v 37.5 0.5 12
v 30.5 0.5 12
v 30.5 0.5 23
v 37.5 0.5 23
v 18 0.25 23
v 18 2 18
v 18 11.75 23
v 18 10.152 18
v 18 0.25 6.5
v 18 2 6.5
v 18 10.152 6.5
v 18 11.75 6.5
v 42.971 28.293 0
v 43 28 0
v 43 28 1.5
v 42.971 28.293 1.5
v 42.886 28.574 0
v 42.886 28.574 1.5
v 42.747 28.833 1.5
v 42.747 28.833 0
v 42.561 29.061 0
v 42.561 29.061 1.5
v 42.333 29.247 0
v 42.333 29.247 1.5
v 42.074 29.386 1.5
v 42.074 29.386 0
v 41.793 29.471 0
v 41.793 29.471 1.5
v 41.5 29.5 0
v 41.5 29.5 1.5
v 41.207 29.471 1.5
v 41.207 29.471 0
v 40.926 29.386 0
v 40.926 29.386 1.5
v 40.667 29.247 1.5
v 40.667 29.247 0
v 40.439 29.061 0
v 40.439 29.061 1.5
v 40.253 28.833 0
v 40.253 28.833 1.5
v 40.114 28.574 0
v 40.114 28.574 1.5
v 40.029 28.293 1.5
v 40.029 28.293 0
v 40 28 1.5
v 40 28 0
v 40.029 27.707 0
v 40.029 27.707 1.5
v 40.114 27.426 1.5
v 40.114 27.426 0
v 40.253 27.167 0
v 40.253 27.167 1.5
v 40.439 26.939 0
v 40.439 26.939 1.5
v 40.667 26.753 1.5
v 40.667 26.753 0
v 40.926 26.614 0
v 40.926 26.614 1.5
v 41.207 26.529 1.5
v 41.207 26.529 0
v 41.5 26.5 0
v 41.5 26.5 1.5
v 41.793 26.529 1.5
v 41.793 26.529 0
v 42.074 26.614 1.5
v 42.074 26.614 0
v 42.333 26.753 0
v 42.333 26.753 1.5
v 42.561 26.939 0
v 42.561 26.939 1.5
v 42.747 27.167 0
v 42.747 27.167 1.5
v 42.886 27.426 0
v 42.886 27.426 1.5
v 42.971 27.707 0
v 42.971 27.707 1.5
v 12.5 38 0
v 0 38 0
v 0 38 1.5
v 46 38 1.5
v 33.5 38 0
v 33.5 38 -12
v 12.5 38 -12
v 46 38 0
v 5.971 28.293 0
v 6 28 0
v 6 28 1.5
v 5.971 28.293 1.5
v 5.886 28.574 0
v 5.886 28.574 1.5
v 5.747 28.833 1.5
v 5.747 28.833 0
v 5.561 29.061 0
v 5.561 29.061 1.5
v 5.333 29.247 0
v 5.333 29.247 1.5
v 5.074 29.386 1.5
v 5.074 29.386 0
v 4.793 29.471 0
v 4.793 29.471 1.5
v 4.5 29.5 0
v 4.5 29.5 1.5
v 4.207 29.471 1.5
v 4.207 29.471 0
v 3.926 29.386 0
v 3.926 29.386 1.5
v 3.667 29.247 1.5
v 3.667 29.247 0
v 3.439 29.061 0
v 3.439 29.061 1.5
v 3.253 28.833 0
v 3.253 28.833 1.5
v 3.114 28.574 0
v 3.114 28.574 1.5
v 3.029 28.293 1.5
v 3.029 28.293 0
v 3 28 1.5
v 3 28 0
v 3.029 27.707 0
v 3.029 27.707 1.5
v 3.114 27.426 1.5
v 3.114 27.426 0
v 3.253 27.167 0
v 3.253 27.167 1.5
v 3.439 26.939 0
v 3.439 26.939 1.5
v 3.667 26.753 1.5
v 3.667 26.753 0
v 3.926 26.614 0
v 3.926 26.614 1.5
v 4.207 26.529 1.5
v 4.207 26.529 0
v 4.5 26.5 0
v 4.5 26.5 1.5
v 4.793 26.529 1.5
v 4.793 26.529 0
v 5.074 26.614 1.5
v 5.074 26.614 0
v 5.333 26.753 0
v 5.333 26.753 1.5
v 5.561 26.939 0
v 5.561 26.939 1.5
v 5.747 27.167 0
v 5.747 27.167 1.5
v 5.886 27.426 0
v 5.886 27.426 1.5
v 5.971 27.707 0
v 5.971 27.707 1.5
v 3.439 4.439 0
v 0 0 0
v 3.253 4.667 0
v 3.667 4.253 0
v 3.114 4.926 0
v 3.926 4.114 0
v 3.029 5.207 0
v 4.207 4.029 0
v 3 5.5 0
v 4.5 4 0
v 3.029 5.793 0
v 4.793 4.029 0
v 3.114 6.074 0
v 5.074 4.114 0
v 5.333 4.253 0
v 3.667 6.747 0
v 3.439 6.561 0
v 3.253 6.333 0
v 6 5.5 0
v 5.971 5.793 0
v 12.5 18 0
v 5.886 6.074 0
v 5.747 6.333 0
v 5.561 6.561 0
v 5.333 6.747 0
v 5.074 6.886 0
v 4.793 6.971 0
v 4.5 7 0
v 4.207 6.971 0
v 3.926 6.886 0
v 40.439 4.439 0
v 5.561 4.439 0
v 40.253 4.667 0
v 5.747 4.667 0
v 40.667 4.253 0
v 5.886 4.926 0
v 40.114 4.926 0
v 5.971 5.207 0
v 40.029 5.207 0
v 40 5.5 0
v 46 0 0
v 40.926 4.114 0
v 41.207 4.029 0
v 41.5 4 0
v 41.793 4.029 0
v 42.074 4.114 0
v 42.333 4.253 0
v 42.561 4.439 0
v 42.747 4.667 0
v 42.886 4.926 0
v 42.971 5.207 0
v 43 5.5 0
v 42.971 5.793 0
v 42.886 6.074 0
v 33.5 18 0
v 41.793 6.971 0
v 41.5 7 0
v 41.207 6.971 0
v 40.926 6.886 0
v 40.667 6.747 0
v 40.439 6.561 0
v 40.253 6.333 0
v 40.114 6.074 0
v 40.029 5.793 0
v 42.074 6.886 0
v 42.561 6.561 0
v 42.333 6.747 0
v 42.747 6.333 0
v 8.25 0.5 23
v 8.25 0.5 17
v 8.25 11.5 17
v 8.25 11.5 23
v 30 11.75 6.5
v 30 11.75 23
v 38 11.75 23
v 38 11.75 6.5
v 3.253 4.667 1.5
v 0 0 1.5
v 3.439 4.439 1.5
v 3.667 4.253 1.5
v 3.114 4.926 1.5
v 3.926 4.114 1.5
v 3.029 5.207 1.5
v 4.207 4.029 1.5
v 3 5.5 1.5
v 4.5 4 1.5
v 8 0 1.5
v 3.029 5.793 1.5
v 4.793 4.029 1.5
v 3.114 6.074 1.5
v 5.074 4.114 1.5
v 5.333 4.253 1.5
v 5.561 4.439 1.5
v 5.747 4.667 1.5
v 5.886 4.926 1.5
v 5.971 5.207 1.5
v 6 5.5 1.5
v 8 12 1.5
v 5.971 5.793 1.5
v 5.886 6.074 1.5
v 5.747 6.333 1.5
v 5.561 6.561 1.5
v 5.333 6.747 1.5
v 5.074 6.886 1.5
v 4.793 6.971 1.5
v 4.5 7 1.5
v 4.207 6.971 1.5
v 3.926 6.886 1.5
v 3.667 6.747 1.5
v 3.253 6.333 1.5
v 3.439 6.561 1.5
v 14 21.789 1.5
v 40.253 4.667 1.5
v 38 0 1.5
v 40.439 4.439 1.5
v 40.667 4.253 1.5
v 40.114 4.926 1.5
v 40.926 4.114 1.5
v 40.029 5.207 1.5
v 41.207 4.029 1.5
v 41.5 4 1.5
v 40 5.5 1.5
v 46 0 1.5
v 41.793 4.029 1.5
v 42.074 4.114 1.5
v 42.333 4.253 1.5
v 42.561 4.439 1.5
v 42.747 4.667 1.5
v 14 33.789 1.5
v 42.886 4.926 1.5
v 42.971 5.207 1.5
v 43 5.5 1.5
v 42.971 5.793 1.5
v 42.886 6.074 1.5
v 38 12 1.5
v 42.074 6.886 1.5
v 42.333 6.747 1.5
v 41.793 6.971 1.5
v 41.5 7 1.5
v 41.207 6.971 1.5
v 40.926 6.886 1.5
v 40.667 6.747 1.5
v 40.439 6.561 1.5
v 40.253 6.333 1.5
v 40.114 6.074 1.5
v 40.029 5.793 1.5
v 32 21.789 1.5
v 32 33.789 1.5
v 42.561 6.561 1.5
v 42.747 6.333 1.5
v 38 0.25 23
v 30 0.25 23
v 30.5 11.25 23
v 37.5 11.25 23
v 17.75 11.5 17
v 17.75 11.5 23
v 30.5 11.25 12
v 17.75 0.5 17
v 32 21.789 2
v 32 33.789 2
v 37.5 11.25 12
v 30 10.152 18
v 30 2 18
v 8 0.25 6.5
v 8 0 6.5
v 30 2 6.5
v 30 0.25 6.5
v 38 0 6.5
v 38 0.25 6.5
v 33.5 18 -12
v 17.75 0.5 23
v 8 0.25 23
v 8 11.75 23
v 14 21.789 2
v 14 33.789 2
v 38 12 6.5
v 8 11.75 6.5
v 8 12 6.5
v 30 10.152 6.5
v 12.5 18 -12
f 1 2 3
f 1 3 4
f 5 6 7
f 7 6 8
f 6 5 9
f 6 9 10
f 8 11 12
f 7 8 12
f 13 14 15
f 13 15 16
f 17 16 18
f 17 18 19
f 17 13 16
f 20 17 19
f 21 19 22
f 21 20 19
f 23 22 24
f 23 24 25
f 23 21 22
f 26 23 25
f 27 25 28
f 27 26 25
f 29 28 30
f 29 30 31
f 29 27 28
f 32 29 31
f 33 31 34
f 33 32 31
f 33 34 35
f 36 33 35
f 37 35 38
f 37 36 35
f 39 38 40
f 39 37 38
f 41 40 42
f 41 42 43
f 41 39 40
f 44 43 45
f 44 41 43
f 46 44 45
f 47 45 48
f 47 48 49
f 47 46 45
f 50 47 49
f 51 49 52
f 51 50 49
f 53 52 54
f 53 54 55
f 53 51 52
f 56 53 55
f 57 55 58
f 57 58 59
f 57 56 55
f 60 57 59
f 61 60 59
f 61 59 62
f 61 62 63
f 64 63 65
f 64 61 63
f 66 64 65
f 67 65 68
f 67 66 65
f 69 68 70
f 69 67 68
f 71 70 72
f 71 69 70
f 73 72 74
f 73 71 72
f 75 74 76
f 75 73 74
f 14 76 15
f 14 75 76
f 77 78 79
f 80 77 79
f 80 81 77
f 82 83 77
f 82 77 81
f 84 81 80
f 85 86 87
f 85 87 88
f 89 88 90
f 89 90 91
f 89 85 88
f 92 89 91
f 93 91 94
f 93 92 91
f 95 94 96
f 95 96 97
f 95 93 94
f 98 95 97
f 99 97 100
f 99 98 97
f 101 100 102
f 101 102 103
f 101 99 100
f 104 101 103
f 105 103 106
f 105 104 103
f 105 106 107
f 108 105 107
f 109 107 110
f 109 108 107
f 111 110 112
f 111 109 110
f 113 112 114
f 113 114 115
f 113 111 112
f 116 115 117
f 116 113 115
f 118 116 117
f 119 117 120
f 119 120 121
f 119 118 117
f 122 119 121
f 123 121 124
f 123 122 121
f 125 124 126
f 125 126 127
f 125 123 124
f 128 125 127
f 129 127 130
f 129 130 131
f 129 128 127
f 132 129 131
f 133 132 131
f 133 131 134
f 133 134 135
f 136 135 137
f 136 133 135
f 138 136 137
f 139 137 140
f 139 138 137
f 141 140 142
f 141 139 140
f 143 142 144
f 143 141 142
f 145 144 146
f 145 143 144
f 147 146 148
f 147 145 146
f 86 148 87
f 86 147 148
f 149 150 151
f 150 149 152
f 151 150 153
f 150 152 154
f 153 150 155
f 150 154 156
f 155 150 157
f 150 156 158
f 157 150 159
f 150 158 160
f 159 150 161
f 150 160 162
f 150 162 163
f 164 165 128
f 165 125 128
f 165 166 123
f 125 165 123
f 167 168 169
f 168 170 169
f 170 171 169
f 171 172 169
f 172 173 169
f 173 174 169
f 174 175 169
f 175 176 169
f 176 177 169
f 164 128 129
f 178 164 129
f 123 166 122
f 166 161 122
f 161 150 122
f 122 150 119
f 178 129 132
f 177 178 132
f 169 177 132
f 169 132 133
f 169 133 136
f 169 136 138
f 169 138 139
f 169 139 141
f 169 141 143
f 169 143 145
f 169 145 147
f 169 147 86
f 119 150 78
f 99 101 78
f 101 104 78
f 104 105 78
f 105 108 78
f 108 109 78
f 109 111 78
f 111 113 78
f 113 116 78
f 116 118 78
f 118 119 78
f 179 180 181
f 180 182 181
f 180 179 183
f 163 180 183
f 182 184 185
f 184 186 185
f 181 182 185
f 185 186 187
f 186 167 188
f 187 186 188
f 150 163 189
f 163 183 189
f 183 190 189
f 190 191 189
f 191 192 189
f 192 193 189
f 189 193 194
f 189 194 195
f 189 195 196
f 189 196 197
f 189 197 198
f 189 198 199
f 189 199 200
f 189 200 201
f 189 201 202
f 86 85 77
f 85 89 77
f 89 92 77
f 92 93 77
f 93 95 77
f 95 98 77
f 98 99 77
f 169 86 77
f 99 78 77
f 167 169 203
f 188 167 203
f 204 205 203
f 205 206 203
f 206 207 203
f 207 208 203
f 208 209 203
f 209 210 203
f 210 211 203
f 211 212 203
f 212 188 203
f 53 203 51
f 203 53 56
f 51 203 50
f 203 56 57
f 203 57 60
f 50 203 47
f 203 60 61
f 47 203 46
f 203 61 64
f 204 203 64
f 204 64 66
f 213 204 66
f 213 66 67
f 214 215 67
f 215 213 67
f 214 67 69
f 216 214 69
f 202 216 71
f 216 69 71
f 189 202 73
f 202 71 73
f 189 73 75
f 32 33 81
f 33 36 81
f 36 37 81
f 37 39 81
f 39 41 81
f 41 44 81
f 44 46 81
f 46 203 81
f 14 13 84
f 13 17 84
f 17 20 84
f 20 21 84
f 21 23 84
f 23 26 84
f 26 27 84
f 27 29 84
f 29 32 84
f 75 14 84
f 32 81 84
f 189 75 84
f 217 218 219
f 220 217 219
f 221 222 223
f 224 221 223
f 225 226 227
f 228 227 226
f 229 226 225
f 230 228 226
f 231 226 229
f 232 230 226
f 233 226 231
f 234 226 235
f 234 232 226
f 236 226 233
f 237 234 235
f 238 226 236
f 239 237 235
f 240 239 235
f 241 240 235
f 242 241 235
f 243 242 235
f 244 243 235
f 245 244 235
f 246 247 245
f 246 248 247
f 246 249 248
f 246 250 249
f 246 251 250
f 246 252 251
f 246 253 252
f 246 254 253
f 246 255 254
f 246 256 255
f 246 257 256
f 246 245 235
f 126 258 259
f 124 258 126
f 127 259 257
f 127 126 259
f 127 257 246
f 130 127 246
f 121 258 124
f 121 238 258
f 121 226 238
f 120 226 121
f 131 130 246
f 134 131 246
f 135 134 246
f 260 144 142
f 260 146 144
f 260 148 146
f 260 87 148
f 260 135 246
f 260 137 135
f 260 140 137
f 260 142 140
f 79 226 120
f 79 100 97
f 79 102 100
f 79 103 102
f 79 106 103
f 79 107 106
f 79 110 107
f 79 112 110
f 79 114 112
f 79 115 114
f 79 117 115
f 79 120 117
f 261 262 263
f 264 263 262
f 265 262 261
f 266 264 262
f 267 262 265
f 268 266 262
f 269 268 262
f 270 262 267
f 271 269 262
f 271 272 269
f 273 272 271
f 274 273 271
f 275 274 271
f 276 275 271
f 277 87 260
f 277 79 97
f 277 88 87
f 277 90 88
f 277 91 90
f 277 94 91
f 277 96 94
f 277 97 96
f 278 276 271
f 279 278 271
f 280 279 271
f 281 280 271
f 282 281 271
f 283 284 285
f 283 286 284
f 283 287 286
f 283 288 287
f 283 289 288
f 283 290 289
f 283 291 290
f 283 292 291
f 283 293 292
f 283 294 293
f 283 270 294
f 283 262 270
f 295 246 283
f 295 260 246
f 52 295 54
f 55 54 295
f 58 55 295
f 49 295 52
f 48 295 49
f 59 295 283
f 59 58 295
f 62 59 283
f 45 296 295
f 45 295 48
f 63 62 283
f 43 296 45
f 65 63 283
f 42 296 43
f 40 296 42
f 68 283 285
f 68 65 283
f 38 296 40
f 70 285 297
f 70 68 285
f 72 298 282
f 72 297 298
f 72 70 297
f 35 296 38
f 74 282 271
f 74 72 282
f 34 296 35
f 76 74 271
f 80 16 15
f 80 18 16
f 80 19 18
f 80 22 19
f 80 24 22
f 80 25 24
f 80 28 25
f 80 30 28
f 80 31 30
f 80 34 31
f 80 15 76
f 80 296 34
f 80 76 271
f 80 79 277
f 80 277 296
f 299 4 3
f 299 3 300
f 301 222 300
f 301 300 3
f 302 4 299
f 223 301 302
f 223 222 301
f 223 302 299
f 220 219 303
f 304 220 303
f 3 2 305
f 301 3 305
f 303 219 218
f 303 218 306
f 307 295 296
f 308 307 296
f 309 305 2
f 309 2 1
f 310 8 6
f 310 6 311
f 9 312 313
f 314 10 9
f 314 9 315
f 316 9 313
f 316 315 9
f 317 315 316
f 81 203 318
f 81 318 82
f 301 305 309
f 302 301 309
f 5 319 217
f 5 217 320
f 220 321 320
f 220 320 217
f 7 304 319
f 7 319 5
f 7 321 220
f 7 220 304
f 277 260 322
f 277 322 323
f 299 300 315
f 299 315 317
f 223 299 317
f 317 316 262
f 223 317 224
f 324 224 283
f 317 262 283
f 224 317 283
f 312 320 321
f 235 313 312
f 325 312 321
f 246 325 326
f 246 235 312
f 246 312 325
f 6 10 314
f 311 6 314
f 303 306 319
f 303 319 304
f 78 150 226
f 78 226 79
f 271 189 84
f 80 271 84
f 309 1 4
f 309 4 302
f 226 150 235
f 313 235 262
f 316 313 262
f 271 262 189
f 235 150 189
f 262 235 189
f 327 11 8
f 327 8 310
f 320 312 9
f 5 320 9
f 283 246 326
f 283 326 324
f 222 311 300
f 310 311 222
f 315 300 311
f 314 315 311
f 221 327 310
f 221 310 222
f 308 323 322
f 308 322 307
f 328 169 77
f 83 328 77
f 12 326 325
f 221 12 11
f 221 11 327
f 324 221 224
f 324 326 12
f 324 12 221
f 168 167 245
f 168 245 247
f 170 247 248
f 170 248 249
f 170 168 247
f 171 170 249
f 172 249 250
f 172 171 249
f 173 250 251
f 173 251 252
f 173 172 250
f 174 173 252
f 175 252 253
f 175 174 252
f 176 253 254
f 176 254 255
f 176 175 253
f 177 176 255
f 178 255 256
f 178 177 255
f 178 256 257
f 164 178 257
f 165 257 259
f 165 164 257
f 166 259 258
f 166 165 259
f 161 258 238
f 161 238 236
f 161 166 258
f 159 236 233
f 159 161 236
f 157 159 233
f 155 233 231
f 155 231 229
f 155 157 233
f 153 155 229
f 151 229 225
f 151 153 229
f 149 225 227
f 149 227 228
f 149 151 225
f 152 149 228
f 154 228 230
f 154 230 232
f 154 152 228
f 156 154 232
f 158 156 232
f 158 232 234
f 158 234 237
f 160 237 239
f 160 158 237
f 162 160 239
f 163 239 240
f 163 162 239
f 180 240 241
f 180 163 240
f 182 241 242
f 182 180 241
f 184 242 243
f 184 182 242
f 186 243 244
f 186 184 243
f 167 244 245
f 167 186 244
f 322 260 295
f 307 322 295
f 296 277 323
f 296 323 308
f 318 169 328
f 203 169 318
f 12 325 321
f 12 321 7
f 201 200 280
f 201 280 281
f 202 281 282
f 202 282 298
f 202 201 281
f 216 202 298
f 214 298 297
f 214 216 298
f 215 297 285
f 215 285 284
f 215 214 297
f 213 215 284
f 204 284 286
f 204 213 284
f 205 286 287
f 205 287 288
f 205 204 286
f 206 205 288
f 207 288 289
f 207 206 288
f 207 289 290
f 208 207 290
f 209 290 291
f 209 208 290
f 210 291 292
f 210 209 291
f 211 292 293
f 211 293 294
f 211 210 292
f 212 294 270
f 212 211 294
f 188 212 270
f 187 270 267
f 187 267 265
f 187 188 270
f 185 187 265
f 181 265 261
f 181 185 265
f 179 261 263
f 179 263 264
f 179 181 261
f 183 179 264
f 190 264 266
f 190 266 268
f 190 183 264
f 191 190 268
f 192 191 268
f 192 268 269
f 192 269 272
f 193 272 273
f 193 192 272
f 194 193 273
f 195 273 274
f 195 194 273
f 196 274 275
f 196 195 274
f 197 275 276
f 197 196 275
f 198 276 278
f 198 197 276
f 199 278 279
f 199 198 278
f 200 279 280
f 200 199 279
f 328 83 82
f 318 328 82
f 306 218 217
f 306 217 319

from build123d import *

# Parameters (mm, degrees)
SKETCH2_W            = 46
SKETCH2_H            = 38
SKETCH2_R            = 1.5
BOSS_EXTRUDE1_DEPTH  = 1.5
SKETCH12_W           = 21
SKETCH12_H           = 20
BOSS_EXTRUDE6_DEPTH  = 12
SKETCH13_W           = 18
SKETCH13_H           = 12
BOSS_EXTRUDE7_DEPTH  = 2
SKETCH15_W           = 30
SKETCH15_H           = 12
BOSS_EXTRUDE8_DEPTH  = 6.5
SKETCH16_W           = 10
SKETCH16_H           = 11.5
BOSS_EXTRUDE9_DEPTH  = 23
SKETCH17_W           = 8
SKETCH17_H           = 11.5
BOSS_EXTRUDE10_DEPTH = 23
SKETCH18_W           = 12
SKETCH18_H           = 8.151595729
BOSS_EXTRUDE11_DEPTH = 18
SKETCH19_W           = 9.5
SKETCH19_H           = 11
CUT_EXTRUDE3_DEPTH   = 16.5
SKETCH22_W           = 7
SKETCH22_H           = 10.75
CUT_EXTRUDE4_DEPTH   = 16.5


with BuildPart() as part:
    # Sketch2 → Boss-Extrude1 (new body)
    with BuildSketch(Plane.XY):
        with Locations((23, 19)):
            Rectangle(SKETCH2_W, SKETCH2_H)
        with Locations((4.5, 28)):
            Circle(SKETCH2_R, mode=Mode.SUBTRACT)
        with Locations((4.5, 5.5)):
            Circle(SKETCH2_R, mode=Mode.SUBTRACT)
        with Locations((41.5, 5.5)):
            Circle(SKETCH2_R, mode=Mode.SUBTRACT)
        with Locations((41.5, 28)):
            Circle(SKETCH2_R, mode=Mode.SUBTRACT)
    extrude(amount=BOSS_EXTRUDE1_DEPTH)

    # Sketch12 → Boss-Extrude6 (add)
    with BuildSketch(Plane.XY):
        with Locations((23, 28)):
            Rectangle(SKETCH12_W, SKETCH12_H)
    extrude(amount=-BOSS_EXTRUDE6_DEPTH)

    # Sketch13 → Boss-Extrude7 (add)
    with BuildSketch(Plane.XY):
        with Locations((23, 27.789125994)):
            Rectangle(SKETCH13_W, SKETCH13_H)
    extrude(amount=BOSS_EXTRUDE7_DEPTH)

    # Sketch15 → Boss-Extrude8 (add)
    with BuildSketch(Plane.XY):
        with Locations((23, 6)):
            Rectangle(SKETCH15_W, SKETCH15_H)
    extrude(amount=BOSS_EXTRUDE8_DEPTH)

    # Sketch16 → Boss-Extrude9 (add)
    with BuildSketch(Plane.XY):
        with Locations((13, 6)):
            Rectangle(SKETCH16_W, SKETCH16_H)
    extrude(amount=BOSS_EXTRUDE9_DEPTH)

    # Sketch17 → Boss-Extrude10 (add)
    with BuildSketch(Plane.XY):
        with Locations((34, 6)):
            Rectangle(SKETCH17_W, SKETCH17_H)
    extrude(amount=BOSS_EXTRUDE10_DEPTH)

    # Sketch18 → Boss-Extrude11 (add)
    with BuildSketch(Plane.XY):
        with Locations((24, 6.075797865)):
            Rectangle(SKETCH18_W, SKETCH18_H)
    extrude(amount=BOSS_EXTRUDE11_DEPTH)

    # Sketch19 → Cut-Extrude3 (cut)
    with BuildSketch(Plane.XY.offset(17)):
        with Locations((13, 6)):
            Rectangle(SKETCH19_W, SKETCH19_H)
    extrude(amount=CUT_EXTRUDE3_DEPTH, mode=Mode.SUBTRACT)

    # Sketch22 → Cut-Extrude4 (cut)
    with BuildSketch(Plane.XY.offset(12)):
        with Locations((34, 5.875)):
            Rectangle(SKETCH22_W, SKETCH22_H)
    extrude(amount=CUT_EXTRUDE4_DEPTH, mode=Mode.SUBTRACT)


solid = part.part
